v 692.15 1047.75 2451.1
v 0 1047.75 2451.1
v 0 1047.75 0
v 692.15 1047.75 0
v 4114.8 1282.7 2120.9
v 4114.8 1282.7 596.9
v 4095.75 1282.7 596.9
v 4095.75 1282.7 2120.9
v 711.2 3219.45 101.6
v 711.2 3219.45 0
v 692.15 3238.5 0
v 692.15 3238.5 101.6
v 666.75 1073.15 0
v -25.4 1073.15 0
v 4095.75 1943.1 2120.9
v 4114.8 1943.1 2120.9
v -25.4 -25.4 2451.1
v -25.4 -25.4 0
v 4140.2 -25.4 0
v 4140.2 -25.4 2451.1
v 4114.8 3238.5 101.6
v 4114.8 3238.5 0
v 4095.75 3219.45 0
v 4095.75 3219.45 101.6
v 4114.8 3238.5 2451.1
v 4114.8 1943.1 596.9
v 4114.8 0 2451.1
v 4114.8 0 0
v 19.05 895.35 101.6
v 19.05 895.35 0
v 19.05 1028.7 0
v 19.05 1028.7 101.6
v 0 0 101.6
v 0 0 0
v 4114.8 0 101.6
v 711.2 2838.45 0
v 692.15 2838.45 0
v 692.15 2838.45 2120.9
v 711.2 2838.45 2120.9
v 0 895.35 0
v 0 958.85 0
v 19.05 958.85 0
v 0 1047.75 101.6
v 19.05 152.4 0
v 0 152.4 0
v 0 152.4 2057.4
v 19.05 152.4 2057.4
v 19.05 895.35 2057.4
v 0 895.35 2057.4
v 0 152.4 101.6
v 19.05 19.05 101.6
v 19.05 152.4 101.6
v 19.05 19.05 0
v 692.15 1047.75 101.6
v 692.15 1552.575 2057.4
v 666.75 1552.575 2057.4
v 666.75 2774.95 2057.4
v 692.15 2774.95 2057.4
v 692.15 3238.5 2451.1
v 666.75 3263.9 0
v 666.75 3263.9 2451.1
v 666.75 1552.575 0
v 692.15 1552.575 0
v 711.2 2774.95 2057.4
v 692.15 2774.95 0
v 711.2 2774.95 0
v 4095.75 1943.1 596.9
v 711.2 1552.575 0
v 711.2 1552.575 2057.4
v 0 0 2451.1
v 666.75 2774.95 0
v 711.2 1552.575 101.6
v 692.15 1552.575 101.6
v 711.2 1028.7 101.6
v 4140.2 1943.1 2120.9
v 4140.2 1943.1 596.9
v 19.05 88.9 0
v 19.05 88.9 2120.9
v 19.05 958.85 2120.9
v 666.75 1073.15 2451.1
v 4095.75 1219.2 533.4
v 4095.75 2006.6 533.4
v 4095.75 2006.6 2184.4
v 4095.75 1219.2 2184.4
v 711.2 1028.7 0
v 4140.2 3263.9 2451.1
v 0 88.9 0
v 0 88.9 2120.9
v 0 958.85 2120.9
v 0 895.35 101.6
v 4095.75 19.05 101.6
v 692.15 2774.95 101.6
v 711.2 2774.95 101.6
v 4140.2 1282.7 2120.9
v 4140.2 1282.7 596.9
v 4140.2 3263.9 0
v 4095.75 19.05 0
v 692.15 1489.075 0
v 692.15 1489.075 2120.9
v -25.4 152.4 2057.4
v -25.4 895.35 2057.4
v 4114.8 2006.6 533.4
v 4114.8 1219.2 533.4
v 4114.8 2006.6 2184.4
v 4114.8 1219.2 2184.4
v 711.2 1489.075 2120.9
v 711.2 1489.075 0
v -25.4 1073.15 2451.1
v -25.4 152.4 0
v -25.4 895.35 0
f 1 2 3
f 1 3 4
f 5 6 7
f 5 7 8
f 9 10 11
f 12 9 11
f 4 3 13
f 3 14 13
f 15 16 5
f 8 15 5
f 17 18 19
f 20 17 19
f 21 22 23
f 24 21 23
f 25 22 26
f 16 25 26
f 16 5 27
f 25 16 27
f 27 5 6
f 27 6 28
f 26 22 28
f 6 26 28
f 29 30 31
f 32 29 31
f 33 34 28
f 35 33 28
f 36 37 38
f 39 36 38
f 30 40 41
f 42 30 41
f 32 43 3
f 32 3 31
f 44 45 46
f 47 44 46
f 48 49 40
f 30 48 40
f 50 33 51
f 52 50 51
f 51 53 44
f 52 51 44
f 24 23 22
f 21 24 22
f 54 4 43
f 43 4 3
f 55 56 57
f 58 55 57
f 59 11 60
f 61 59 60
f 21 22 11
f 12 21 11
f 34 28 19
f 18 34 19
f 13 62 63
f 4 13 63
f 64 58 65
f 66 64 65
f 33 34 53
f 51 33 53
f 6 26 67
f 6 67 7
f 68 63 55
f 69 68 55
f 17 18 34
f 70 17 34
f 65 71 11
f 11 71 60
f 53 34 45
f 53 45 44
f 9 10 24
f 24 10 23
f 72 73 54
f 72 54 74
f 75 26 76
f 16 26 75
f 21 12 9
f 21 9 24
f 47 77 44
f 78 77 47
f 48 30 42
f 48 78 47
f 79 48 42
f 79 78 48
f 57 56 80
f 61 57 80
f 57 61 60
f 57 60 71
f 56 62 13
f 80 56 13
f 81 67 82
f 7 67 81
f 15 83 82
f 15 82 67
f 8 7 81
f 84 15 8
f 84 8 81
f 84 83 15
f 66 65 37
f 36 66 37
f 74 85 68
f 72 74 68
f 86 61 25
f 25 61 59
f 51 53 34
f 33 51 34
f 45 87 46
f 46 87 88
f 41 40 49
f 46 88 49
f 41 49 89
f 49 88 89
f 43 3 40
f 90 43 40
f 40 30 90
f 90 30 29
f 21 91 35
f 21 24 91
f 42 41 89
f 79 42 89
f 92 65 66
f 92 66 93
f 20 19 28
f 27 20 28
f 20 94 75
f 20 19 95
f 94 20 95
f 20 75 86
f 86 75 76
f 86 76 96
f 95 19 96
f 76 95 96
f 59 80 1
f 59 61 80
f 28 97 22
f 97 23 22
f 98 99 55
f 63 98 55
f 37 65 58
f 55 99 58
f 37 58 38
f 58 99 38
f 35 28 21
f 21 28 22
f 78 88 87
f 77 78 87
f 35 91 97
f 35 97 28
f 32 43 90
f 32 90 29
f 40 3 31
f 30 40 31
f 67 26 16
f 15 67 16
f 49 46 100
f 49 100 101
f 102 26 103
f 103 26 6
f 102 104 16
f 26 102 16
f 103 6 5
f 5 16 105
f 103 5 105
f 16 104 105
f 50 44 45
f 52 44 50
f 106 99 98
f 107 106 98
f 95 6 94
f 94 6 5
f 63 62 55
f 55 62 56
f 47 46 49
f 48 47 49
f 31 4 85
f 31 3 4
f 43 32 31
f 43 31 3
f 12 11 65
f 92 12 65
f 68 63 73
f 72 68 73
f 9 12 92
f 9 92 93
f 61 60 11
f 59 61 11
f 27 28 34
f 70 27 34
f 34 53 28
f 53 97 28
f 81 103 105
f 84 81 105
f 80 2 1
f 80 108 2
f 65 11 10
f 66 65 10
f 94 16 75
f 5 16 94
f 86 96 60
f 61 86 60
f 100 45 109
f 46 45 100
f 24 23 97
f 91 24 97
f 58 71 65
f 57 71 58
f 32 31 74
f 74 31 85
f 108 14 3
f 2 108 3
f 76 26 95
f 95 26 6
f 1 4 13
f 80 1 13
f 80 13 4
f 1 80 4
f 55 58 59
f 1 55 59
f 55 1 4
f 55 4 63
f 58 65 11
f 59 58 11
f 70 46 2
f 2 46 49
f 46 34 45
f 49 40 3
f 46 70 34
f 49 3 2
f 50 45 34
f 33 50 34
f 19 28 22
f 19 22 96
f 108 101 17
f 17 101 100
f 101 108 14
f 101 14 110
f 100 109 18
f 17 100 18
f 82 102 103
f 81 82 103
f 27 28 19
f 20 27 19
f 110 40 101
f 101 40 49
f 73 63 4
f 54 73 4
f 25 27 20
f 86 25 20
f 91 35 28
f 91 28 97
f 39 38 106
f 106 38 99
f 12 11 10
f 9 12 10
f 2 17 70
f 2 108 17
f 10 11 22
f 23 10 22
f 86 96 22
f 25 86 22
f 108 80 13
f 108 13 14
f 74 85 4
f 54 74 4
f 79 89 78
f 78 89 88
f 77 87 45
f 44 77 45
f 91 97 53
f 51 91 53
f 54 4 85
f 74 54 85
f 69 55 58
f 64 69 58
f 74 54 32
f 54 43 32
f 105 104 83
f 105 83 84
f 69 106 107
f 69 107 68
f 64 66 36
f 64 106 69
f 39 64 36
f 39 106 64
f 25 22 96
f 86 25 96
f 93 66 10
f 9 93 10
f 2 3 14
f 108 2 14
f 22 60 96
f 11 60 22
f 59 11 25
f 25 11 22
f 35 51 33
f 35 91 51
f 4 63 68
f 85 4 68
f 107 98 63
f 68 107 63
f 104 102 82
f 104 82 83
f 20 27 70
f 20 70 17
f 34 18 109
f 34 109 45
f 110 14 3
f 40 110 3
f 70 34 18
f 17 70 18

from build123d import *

# Parameters (mm, degrees)
F1_DEPTH       = 2451.1
F2_DEPTH       = 2451.1
F3_DEPTH       = 2451.1
F4_DEPTH       = 2451.1
F5_DEPTH       = 2451.1
F6_DEPTH       = 2451.1
F7_DEPTH       = 101.6
F8_DEPTH       = 101.6
F9_DEPTH       = 101.6
F10_DEPTH      = 101.6
F11_DEPTH      = 101.6
F12_DEPTH      = 101.6
F13_W          = 742.95
F13_H          = 2057.4
F14_DEPTH      = 19.05
F14_DEPTH_BACK = 25.4
F15_DEPTH      = 19.05
F16_W          = 1222.375
F16_H          = 2057.4
F17_DEPTH      = 25.4
F17_DEPTH_BACK = 19.05
F18_DEPTH      = 19.05
F19_W          = 660.4
F19_H          = 1524
F3_FACE1_W     = 3289.3
F3_FACE1_H     = 2451.1
F20_DEPTH      = 25.4
F19_W_2        = 787.4
F19_H_2        = 1651
F21_DEPTH      = 19.05


with BuildPart() as f1:
    # F0 (on Top) → F1 (new body)
    with BuildSketch(Plane.XY):
        Polygon((-25.4, -25.4), (0, 0), (0, 1047.75), (-25.4, 1073.15), align=None)
    extrude(amount=F1_DEPTH)


with BuildPart() as f2:
    # F0 (on Top) → F2 (new body)
    with BuildSketch(Plane.XY):
        Polygon((4114.8, 0), (0, 0), (-25.4, -25.4), (4140.2, -25.4), align=None)
    extrude(amount=F2_DEPTH)


with BuildPart() as f3:
    # F0 (on Top) → F3 (new body)
    with BuildSketch(Plane.XY):
        Polygon((4114.8, 3238.5), (4114.8, 0), (4140.2, -25.4), (4140.2, 3263.9), align=None)
    extrude(amount=F3_DEPTH)

    # F19 (on face) + F3_face1 (on face) → F20 (cut)
    with BuildSketch(Plane(origin=(4114.8, 0, 0), x_dir=(0, -1, 0), z_dir=(-1, 0, 0))):
        with Locations((-1612.9, 1358.9)):
            Rectangle(F19_W, F19_H)
    with BuildSketch(Plane(origin=(4140.2, 1619.25, 1225.55), x_dir=(0, 1, 0), z_dir=(1, 0, 0))):
        Rectangle(F3_FACE1_W, F3_FACE1_H)
    extrude(amount=-F20_DEPTH, dir=(-1, 0, 0), mode=Mode.SUBTRACT)


with BuildPart() as f4:
    # F0 (on Top) → F4 (new body)
    with BuildSketch(Plane.XY):
        Polygon((692.15, 3238.5), (4114.8, 3238.5), (4140.2, 3263.9), (666.75, 3263.9), align=None)
    extrude(amount=F4_DEPTH)


with BuildPart() as f5:
    # F0 (on Top) → F5 (new body)
    with BuildSketch(Plane.XY):
        Polygon((666.75, 1073.15), (692.15, 1047.75), (692.15, 3238.5), (666.75, 3263.9), align=None)
    extrude(amount=F5_DEPTH)


with BuildPart() as f6:
    # F0 (on Top) → F6 (new body)
    with BuildSketch(Plane.XY):
        Polygon((-25.4, 1073.15), (0, 1047.75), (692.15, 1047.75), (666.75, 1073.15), align=None)
    extrude(amount=F6_DEPTH)


with BuildPart() as f7:
    # F0 (on Top) → F7 (new body)
    with BuildSketch(Plane.XY):
        Polygon((0, 1047.75), (0, 0), (19.05, 19.05), (19.05, 1028.7), align=None)
    extrude(amount=F7_DEPTH)


with BuildPart() as f8:
    # F0 (on Top) → F8 (new body)
    with BuildSketch(Plane.XY):
        Polygon((19.05, 19.05), (0, 0), (4114.8, 0), (4095.75, 19.05), align=None)
    extrude(amount=F8_DEPTH)


with BuildPart() as f9:
    # F0 (on Top) → F9 (new body)
    with BuildSketch(Plane.XY):
        Polygon((4095.75, 19.05), (4114.8, 0), (4114.8, 3238.5), (4095.75, 3219.45), align=None)
    extrude(amount=F9_DEPTH)


with BuildPart() as f10:
    # F0 (on Top) → F10 (new body)
    with BuildSketch(Plane.XY):
        Polygon((4095.75, 3219.45), (4114.8, 3238.5), (692.15, 3238.5), (711.2, 3219.45), align=None)
    extrude(amount=F10_DEPTH)


with BuildPart() as f11:
    # F0 (on Top) → F11 (new body)
    with BuildSketch(Plane.XY):
        Polygon((692.15, 3238.5), (692.15, 1047.75), (711.2, 1028.7), (711.2, 3219.45), align=None)
    extrude(amount=F11_DEPTH)


with BuildPart() as f12:
    # F0 (on Top) → F12 (new body)
    with BuildSketch(Plane.XY):
        Polygon((692.15, 1047.75), (0, 1047.75), (19.05, 1028.7), (711.2, 1028.7), align=None)
    extrude(amount=F12_DEPTH)


with BuildPart() as f14_tool:
    # F13 (on face) → F14 (new body, two sides)
    with BuildSketch(Plane.YZ) as f14_sk:
        with Locations((523.875, 1028.7)):
            Rectangle(F13_W, F13_H)
    extrude(amount=F14_DEPTH)
    extrude(f14_sk.sketch, amount=-F14_DEPTH_BACK)


with BuildPart() as f1_1:
    add(f1.part)

    # F14: cut by f14_tool
    add(f14_tool.part, mode=Mode.SUBTRACT)


with BuildPart() as f7_1:
    add(f7.part)

    # F14: cut by f14_tool
    add(f14_tool.part, mode=Mode.SUBTRACT)


with BuildPart() as f15:
    # F13 (on face) → F15 (new body)
    with BuildSketch(Plane.YZ):
        Polygon((88.9, 2120.9), (88.9, 0), (152.4, 0), (152.4, 2057.4), (895.35, 2057.4), (895.35, 0), (958.85, 0), (958.85, 2120.9), align=None)
    extrude(amount=F15_DEPTH)


with BuildPart() as f17_tool:
    # F16 (on face) → F17 (new body, two sides)
    with BuildSketch(Plane.YZ.offset(692.15)) as f17_sk:
        with Locations((2163.7625, 1028.7)):
            Rectangle(F16_W, F16_H)
    extrude(amount=-F17_DEPTH)
    extrude(f17_sk.sketch, amount=F17_DEPTH_BACK)


with BuildPart() as f5_1:
    add(f5.part)

    # F17: cut by f17_tool
    add(f17_tool.part, mode=Mode.SUBTRACT)


with BuildPart() as f11_1:
    add(f11.part)

    # F17: cut by f17_tool
    add(f17_tool.part, mode=Mode.SUBTRACT)


with BuildPart() as f18:
    # F16 (on face) → F18 (new body)
    with BuildSketch(Plane.YZ.offset(692.15)):
        Polygon((2838.45, 2120.9), (1489.075, 2120.9), (1489.075, 0), (1552.575, 0), (1552.575, 2057.4), (2774.95, 2057.4), (2774.95, 0), (2838.45, 0), align=None)
    extrude(amount=F18_DEPTH)


with BuildPart() as f21:
    # F19 (on face) → F21 (new body)
    with BuildSketch(Plane(origin=(4114.8, 0, 0), x_dir=(0, -1, 0), z_dir=(-1, 0, 0))):
        with Locations((-1612.9, 1358.9)):
            Rectangle(F19_W_2, F19_H_2)
        with Locations((-1612.9, 1358.9)):
            Rectangle(F19_W, F19_H, mode=Mode.SUBTRACT)
    extrude(amount=F21_DEPTH)


solid = Compound([f2.part, f3.part, f4.part, f6.part, f8.part, f9.part, f10.part, f12.part, f1_1.part, f7_1.part, f15.part, f5_1.part, f11_1.part, f18.part, f21.part])
